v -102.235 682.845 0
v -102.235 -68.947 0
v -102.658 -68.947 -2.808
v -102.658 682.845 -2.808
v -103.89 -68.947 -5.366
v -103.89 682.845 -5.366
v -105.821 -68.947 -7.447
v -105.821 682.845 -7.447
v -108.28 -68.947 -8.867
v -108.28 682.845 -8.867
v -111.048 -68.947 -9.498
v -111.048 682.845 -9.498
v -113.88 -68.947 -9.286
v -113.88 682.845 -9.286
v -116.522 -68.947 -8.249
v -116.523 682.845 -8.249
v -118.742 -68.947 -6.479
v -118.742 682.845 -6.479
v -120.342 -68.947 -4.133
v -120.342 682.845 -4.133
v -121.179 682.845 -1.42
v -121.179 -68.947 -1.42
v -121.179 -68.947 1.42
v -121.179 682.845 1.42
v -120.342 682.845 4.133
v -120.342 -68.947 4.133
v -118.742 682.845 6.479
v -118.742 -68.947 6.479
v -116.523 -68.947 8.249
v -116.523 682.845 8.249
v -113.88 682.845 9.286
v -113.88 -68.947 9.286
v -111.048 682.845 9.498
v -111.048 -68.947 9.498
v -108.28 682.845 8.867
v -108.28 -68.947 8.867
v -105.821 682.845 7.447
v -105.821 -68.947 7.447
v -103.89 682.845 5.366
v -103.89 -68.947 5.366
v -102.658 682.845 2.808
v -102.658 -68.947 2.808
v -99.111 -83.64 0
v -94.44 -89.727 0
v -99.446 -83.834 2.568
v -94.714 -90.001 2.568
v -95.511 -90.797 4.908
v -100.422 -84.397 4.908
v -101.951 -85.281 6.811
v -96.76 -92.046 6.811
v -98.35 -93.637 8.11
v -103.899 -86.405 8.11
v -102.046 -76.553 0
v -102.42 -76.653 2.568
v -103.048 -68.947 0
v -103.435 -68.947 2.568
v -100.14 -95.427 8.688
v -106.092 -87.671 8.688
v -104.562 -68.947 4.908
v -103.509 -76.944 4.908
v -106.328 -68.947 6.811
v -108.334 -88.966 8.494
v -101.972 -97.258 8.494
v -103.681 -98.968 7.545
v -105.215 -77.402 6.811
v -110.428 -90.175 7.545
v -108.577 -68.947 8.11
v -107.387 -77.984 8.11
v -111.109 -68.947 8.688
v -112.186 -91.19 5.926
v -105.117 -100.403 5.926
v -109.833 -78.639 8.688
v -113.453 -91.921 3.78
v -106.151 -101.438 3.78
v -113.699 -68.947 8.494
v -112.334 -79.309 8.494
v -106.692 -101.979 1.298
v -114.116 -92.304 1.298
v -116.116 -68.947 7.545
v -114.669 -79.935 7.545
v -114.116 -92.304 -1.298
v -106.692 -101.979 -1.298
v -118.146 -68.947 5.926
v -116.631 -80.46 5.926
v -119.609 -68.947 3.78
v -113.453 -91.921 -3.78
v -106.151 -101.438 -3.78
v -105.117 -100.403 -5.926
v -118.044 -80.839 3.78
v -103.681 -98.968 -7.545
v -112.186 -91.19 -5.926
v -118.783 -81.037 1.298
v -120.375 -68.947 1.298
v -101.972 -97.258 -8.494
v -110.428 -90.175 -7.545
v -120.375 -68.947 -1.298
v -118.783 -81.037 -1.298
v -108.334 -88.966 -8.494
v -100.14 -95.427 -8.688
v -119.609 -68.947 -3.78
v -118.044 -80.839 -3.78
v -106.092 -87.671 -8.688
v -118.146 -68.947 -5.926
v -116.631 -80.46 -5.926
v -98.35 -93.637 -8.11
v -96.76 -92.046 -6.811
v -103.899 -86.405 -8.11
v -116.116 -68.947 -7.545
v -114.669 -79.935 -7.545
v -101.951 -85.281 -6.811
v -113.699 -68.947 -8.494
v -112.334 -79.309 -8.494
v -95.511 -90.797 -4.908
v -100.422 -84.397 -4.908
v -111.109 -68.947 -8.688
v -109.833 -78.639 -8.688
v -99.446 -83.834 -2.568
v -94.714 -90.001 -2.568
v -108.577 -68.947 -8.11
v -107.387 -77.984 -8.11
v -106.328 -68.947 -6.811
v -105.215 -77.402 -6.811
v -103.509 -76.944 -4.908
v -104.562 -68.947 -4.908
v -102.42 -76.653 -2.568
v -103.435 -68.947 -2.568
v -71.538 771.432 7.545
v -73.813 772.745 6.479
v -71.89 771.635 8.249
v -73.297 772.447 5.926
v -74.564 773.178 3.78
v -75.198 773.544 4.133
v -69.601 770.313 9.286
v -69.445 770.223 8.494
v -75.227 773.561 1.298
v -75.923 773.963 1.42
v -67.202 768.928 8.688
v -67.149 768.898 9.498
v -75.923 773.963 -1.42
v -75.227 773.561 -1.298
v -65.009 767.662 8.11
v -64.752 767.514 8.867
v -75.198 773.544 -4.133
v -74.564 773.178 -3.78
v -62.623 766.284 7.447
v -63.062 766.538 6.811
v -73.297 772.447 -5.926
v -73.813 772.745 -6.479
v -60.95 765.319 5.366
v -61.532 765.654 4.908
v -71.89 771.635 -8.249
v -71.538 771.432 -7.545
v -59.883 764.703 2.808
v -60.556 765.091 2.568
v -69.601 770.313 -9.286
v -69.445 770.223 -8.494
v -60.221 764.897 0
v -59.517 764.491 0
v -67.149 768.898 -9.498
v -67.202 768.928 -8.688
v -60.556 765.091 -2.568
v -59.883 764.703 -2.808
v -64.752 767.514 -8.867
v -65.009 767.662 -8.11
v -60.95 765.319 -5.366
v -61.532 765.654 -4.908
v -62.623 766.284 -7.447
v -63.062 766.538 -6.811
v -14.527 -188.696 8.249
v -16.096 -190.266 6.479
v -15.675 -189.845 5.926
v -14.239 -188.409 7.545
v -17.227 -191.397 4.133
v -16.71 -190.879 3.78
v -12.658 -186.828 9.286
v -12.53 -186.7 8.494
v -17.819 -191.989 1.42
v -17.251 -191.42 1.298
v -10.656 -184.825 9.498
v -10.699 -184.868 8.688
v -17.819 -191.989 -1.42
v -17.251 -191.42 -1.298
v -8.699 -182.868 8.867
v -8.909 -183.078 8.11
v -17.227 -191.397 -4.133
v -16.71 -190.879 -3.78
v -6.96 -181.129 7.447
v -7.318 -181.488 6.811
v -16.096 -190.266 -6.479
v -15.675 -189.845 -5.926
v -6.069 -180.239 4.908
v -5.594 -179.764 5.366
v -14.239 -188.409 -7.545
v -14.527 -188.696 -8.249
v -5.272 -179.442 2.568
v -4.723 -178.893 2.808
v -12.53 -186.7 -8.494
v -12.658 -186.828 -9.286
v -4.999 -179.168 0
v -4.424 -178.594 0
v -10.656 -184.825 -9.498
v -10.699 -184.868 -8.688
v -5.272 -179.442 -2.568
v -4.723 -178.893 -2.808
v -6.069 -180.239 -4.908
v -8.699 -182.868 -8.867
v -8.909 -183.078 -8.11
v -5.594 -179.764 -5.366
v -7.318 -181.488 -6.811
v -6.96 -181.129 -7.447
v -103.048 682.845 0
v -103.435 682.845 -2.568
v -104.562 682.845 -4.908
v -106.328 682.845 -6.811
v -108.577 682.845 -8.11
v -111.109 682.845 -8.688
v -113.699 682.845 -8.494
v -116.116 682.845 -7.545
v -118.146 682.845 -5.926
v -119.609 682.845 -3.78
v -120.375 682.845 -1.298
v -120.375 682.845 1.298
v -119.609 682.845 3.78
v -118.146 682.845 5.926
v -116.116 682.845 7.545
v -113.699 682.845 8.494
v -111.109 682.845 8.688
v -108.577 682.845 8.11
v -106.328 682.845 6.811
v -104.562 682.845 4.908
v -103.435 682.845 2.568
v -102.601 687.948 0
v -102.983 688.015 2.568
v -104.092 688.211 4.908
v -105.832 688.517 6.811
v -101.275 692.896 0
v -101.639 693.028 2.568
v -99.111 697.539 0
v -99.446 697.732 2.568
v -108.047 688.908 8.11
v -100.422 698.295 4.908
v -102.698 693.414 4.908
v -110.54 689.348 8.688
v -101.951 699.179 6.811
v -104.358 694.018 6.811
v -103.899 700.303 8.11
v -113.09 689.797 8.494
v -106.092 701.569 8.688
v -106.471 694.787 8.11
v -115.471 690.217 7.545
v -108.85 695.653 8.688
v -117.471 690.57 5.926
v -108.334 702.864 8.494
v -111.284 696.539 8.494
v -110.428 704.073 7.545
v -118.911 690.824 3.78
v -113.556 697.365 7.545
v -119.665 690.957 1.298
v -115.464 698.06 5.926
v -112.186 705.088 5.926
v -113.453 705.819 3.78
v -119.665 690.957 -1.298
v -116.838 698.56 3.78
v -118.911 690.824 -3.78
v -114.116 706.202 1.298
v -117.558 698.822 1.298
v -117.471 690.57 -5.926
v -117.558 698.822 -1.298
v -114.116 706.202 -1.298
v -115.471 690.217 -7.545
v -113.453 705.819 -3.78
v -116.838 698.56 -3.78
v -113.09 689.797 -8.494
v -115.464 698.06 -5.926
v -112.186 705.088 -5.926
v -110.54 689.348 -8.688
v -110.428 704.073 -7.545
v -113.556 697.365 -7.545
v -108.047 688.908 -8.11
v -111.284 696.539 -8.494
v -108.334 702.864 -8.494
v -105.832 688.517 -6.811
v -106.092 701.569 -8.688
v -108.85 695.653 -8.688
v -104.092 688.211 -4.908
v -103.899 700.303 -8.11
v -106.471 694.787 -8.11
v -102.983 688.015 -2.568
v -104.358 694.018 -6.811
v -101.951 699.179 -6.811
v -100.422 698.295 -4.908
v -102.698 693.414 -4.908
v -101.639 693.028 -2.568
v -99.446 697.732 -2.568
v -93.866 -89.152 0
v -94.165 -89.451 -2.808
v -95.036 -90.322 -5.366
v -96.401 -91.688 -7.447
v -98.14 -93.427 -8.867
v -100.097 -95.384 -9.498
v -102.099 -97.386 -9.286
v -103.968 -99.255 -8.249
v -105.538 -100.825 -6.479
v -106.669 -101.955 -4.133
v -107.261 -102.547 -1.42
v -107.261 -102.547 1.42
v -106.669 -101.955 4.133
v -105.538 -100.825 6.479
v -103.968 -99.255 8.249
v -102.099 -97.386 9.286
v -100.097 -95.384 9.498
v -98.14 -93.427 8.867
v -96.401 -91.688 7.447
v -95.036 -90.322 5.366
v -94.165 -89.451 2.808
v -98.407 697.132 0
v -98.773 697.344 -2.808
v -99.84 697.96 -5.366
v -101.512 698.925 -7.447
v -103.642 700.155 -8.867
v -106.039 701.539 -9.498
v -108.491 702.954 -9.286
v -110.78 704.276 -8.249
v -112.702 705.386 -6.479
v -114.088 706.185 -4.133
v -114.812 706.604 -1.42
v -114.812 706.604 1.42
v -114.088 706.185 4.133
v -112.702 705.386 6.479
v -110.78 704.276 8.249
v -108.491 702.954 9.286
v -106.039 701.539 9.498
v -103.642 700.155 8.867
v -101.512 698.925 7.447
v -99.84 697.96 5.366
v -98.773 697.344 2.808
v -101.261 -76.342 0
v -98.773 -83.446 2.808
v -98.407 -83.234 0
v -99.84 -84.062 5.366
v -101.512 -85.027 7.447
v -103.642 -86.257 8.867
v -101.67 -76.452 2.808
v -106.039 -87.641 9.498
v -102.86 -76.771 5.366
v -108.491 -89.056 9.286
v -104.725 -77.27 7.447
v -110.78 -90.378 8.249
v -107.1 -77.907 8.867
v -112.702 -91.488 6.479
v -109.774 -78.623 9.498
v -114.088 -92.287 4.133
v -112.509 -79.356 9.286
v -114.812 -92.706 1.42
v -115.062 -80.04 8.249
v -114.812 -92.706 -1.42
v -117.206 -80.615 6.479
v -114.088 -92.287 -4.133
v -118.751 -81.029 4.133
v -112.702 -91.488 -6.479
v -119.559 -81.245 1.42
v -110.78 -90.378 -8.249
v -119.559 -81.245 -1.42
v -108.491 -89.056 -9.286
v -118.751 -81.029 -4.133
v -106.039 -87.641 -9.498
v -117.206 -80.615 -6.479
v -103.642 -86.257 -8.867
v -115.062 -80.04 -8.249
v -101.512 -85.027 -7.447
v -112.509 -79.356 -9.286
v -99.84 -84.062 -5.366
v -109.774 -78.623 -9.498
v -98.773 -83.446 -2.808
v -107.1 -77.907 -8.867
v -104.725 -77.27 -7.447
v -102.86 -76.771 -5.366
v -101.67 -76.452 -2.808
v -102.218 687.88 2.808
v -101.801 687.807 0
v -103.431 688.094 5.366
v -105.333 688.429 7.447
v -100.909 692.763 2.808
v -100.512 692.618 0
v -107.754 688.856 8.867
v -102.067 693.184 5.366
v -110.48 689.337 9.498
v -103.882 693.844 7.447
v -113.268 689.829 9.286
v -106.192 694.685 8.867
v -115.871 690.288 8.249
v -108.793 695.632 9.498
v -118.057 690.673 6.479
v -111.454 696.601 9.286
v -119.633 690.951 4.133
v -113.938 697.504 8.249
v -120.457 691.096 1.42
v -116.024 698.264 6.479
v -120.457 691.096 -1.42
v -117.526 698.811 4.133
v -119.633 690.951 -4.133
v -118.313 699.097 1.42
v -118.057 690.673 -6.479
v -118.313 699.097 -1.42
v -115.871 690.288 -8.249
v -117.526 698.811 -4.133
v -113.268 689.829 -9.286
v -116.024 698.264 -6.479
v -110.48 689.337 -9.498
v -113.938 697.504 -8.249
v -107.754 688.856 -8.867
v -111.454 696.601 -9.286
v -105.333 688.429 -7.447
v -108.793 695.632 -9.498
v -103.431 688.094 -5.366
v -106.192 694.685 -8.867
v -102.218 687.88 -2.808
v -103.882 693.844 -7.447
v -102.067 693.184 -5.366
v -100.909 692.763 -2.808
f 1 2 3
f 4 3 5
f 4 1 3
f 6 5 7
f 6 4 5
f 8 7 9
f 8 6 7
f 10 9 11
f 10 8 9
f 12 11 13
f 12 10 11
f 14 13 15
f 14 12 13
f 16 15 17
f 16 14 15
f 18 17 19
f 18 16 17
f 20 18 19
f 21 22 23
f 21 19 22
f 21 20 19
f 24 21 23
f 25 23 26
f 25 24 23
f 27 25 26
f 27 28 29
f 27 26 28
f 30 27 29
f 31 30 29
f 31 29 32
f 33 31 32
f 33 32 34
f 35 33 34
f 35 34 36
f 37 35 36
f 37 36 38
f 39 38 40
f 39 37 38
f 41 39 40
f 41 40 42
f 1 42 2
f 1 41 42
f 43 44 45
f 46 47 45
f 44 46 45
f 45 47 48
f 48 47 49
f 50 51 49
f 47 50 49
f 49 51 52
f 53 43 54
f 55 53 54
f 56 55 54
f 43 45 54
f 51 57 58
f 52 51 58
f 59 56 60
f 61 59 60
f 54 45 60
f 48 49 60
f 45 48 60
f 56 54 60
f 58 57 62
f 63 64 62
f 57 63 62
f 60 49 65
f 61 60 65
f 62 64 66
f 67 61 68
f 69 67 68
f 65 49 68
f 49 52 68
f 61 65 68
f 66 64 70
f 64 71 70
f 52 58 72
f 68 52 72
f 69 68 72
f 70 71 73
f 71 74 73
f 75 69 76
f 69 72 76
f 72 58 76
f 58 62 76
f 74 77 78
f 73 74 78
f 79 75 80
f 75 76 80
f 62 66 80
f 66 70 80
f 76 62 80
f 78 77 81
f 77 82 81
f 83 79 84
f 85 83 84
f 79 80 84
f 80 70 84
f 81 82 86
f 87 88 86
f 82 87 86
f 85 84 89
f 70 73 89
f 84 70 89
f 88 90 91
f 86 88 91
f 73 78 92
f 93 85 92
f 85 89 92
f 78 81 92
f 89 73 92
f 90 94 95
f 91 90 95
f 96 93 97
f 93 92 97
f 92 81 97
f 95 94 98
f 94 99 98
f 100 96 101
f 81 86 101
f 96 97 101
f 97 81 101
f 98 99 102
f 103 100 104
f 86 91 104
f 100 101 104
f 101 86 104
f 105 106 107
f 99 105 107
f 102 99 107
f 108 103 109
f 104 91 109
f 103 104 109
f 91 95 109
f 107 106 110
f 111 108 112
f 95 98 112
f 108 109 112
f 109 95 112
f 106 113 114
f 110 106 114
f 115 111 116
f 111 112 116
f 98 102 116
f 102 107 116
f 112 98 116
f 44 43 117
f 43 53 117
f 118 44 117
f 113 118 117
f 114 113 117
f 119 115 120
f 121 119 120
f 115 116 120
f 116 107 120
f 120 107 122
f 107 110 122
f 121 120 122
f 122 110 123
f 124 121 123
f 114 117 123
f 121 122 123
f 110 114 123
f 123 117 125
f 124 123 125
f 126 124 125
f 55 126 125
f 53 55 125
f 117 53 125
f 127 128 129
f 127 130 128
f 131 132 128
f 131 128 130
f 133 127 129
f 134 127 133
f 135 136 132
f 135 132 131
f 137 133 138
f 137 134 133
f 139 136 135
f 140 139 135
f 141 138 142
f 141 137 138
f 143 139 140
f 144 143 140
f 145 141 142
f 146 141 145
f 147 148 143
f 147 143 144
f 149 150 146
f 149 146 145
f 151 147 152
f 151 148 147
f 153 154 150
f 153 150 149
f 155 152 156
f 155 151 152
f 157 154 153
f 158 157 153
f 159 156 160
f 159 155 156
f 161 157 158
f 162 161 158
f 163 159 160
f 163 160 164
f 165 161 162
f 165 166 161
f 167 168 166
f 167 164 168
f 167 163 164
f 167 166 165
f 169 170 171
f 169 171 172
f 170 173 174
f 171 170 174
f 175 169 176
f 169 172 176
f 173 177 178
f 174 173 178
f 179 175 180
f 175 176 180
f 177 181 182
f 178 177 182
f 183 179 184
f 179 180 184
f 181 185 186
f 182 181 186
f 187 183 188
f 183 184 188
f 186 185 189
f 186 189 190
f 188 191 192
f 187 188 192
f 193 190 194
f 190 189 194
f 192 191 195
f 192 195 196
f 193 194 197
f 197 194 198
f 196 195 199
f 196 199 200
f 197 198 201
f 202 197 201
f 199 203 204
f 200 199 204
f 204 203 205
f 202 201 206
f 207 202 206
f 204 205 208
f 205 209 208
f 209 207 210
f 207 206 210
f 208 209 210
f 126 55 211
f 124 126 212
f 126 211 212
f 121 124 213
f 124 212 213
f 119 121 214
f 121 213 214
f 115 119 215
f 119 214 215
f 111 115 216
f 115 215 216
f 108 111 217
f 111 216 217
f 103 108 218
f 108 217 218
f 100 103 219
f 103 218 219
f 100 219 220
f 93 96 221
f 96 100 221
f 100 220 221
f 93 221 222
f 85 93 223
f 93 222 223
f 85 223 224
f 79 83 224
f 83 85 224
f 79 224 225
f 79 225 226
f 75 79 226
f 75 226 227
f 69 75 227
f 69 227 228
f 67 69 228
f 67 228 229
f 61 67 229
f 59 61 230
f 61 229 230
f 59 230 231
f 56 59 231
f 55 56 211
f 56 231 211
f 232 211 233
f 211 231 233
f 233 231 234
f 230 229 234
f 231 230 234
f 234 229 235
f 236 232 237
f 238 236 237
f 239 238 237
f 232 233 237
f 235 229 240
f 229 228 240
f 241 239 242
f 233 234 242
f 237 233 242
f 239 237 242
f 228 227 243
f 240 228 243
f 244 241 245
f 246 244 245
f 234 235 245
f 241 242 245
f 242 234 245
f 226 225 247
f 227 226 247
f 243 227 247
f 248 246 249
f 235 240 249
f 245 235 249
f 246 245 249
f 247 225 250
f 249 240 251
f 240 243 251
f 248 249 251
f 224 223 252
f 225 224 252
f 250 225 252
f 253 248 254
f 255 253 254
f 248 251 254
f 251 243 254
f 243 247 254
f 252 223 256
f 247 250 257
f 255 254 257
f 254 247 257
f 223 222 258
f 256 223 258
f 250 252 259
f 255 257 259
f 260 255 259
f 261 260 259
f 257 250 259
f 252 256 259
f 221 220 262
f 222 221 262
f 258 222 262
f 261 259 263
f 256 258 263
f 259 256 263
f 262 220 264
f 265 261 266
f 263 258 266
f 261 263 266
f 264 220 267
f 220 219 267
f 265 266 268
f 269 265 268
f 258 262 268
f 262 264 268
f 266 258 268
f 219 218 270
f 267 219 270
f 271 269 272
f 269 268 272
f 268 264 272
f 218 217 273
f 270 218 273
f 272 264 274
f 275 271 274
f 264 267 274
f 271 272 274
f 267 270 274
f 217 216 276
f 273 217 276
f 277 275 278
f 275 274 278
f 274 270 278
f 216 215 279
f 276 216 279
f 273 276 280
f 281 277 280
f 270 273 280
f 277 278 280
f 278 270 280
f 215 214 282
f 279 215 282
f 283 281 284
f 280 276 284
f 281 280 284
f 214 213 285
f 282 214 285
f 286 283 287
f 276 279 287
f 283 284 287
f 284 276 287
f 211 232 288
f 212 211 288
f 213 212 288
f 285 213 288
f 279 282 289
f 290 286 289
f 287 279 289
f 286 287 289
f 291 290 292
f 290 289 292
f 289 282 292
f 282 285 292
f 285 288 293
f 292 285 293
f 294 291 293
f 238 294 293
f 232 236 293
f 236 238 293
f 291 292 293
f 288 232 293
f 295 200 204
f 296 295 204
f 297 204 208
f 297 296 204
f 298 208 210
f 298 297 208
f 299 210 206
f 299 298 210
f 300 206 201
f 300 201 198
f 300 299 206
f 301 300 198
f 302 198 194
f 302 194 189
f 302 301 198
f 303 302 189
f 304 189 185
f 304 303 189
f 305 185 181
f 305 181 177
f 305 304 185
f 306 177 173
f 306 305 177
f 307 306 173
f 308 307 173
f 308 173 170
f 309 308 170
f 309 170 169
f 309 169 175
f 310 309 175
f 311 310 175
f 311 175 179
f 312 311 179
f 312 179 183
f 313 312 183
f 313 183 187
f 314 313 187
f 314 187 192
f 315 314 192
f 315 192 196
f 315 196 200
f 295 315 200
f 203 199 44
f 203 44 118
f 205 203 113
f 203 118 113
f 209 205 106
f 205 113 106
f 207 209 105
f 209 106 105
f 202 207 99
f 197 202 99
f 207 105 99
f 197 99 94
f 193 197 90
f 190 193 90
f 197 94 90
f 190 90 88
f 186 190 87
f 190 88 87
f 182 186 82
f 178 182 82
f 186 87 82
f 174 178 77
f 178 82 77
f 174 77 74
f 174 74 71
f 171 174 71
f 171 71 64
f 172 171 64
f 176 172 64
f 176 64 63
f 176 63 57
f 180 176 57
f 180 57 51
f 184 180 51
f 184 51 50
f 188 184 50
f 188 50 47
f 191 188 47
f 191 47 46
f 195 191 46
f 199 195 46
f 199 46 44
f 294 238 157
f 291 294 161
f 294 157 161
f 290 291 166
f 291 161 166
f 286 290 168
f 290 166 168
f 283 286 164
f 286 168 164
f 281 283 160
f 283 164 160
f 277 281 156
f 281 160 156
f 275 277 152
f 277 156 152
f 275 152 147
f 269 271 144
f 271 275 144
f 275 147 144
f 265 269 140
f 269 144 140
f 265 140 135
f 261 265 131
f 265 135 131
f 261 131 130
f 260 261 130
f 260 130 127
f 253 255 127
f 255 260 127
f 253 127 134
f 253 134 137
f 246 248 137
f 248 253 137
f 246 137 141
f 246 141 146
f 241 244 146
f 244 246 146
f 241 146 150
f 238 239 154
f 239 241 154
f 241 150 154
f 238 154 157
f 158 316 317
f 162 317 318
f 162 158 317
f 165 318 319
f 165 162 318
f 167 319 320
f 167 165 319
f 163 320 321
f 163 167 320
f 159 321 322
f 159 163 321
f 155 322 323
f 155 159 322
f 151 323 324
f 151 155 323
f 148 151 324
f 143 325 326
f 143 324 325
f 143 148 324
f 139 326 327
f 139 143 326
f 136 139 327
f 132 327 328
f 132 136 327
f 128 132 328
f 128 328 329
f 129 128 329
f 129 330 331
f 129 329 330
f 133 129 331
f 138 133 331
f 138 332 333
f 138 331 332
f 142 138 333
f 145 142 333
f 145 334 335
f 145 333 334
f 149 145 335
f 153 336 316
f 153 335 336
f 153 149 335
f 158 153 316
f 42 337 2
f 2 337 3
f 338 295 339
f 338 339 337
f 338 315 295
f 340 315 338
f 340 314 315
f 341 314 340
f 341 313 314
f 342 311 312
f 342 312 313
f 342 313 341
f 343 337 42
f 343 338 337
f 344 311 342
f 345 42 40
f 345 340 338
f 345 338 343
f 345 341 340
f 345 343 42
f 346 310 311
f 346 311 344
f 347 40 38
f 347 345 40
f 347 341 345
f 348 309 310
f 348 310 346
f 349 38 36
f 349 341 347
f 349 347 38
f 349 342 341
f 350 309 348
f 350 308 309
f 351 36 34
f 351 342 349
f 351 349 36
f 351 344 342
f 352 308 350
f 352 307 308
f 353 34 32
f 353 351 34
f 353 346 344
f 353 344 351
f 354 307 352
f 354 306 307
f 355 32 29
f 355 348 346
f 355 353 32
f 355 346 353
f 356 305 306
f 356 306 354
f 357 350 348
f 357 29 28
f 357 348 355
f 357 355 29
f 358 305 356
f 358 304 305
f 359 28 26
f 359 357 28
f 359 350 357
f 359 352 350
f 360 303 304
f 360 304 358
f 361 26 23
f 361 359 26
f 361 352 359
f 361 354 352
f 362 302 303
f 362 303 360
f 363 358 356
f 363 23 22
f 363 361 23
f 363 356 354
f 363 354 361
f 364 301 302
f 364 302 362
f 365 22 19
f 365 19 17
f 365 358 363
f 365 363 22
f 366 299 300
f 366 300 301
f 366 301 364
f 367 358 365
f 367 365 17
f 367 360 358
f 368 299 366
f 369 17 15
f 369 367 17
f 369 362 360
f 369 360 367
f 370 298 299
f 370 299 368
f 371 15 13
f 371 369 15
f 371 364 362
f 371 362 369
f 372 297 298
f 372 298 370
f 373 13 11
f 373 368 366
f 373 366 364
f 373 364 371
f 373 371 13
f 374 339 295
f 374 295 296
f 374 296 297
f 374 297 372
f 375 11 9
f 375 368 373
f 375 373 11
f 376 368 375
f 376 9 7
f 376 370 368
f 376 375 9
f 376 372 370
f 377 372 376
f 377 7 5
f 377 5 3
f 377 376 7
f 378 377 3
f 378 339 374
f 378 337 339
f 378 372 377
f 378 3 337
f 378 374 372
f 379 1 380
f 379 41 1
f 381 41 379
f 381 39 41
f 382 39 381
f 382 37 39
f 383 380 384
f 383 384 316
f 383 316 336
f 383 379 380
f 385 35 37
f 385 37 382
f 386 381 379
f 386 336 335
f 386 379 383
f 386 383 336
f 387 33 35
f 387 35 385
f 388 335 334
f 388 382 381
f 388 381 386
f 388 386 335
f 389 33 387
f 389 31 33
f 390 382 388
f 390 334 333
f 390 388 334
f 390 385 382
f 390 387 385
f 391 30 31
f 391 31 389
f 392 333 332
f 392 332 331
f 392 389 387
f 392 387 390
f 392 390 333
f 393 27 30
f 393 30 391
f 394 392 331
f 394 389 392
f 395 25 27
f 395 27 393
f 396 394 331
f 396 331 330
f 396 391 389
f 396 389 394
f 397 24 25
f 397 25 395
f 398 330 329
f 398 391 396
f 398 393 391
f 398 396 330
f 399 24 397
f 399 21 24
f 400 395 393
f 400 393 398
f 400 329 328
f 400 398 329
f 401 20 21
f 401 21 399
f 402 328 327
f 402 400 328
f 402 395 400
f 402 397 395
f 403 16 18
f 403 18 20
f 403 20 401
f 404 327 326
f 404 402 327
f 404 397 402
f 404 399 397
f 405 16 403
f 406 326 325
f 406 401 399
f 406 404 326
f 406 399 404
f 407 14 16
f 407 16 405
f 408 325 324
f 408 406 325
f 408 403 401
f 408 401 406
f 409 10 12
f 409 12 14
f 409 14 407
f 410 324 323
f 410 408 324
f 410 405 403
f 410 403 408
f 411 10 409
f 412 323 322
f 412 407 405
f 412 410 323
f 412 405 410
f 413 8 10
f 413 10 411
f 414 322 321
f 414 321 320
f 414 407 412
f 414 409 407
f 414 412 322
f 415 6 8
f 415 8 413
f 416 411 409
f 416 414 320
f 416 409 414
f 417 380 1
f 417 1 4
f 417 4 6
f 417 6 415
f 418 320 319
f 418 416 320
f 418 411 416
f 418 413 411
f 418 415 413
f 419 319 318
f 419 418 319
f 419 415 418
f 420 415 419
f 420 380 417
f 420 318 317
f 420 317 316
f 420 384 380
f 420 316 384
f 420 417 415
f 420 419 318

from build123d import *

# Parameters (mm, degrees)
SKETCH2_R   = 9.525
SKETCH2_R_2 = 8.7122


with BuildPart() as part:
    # Sweep1: sweep along a path in Sketch1
    with BuildLine(Plane.XY) as sweep1_path:
        Line((-11.159231637, -185.328818363), (-100.600768363, -95.887281637))
        ThreePointArc((-100.600768363, -95.887281637), (-108.859810189, -83.526752047), (-111.76, -68.946513274))
        Line((-111.76, -68.946513274), (-111.76, 682.844622495))
        ThreePointArc((-111.76, 682.844622495), (-110.461773982, 692.705628113), (-106.655567884, 701.894622495))
        Line((-106.655567884, 701.894622495), (-67.765909488, 769.253486726))
    # Sketch2 → Sweep1 (sweep)
    with BuildSketch(Plane(origin=(0, 0, 0), x_dir=(1, 0, 0), z_dir=(0, 1, 0))):
        with Locations((-111.76, 0)):
            Circle(SKETCH2_R)
        with Locations((-111.76, 0)):
            Circle(SKETCH2_R_2, mode=Mode.SUBTRACT)
    sweep(path=sweep1_path.line)


solid = part.part
